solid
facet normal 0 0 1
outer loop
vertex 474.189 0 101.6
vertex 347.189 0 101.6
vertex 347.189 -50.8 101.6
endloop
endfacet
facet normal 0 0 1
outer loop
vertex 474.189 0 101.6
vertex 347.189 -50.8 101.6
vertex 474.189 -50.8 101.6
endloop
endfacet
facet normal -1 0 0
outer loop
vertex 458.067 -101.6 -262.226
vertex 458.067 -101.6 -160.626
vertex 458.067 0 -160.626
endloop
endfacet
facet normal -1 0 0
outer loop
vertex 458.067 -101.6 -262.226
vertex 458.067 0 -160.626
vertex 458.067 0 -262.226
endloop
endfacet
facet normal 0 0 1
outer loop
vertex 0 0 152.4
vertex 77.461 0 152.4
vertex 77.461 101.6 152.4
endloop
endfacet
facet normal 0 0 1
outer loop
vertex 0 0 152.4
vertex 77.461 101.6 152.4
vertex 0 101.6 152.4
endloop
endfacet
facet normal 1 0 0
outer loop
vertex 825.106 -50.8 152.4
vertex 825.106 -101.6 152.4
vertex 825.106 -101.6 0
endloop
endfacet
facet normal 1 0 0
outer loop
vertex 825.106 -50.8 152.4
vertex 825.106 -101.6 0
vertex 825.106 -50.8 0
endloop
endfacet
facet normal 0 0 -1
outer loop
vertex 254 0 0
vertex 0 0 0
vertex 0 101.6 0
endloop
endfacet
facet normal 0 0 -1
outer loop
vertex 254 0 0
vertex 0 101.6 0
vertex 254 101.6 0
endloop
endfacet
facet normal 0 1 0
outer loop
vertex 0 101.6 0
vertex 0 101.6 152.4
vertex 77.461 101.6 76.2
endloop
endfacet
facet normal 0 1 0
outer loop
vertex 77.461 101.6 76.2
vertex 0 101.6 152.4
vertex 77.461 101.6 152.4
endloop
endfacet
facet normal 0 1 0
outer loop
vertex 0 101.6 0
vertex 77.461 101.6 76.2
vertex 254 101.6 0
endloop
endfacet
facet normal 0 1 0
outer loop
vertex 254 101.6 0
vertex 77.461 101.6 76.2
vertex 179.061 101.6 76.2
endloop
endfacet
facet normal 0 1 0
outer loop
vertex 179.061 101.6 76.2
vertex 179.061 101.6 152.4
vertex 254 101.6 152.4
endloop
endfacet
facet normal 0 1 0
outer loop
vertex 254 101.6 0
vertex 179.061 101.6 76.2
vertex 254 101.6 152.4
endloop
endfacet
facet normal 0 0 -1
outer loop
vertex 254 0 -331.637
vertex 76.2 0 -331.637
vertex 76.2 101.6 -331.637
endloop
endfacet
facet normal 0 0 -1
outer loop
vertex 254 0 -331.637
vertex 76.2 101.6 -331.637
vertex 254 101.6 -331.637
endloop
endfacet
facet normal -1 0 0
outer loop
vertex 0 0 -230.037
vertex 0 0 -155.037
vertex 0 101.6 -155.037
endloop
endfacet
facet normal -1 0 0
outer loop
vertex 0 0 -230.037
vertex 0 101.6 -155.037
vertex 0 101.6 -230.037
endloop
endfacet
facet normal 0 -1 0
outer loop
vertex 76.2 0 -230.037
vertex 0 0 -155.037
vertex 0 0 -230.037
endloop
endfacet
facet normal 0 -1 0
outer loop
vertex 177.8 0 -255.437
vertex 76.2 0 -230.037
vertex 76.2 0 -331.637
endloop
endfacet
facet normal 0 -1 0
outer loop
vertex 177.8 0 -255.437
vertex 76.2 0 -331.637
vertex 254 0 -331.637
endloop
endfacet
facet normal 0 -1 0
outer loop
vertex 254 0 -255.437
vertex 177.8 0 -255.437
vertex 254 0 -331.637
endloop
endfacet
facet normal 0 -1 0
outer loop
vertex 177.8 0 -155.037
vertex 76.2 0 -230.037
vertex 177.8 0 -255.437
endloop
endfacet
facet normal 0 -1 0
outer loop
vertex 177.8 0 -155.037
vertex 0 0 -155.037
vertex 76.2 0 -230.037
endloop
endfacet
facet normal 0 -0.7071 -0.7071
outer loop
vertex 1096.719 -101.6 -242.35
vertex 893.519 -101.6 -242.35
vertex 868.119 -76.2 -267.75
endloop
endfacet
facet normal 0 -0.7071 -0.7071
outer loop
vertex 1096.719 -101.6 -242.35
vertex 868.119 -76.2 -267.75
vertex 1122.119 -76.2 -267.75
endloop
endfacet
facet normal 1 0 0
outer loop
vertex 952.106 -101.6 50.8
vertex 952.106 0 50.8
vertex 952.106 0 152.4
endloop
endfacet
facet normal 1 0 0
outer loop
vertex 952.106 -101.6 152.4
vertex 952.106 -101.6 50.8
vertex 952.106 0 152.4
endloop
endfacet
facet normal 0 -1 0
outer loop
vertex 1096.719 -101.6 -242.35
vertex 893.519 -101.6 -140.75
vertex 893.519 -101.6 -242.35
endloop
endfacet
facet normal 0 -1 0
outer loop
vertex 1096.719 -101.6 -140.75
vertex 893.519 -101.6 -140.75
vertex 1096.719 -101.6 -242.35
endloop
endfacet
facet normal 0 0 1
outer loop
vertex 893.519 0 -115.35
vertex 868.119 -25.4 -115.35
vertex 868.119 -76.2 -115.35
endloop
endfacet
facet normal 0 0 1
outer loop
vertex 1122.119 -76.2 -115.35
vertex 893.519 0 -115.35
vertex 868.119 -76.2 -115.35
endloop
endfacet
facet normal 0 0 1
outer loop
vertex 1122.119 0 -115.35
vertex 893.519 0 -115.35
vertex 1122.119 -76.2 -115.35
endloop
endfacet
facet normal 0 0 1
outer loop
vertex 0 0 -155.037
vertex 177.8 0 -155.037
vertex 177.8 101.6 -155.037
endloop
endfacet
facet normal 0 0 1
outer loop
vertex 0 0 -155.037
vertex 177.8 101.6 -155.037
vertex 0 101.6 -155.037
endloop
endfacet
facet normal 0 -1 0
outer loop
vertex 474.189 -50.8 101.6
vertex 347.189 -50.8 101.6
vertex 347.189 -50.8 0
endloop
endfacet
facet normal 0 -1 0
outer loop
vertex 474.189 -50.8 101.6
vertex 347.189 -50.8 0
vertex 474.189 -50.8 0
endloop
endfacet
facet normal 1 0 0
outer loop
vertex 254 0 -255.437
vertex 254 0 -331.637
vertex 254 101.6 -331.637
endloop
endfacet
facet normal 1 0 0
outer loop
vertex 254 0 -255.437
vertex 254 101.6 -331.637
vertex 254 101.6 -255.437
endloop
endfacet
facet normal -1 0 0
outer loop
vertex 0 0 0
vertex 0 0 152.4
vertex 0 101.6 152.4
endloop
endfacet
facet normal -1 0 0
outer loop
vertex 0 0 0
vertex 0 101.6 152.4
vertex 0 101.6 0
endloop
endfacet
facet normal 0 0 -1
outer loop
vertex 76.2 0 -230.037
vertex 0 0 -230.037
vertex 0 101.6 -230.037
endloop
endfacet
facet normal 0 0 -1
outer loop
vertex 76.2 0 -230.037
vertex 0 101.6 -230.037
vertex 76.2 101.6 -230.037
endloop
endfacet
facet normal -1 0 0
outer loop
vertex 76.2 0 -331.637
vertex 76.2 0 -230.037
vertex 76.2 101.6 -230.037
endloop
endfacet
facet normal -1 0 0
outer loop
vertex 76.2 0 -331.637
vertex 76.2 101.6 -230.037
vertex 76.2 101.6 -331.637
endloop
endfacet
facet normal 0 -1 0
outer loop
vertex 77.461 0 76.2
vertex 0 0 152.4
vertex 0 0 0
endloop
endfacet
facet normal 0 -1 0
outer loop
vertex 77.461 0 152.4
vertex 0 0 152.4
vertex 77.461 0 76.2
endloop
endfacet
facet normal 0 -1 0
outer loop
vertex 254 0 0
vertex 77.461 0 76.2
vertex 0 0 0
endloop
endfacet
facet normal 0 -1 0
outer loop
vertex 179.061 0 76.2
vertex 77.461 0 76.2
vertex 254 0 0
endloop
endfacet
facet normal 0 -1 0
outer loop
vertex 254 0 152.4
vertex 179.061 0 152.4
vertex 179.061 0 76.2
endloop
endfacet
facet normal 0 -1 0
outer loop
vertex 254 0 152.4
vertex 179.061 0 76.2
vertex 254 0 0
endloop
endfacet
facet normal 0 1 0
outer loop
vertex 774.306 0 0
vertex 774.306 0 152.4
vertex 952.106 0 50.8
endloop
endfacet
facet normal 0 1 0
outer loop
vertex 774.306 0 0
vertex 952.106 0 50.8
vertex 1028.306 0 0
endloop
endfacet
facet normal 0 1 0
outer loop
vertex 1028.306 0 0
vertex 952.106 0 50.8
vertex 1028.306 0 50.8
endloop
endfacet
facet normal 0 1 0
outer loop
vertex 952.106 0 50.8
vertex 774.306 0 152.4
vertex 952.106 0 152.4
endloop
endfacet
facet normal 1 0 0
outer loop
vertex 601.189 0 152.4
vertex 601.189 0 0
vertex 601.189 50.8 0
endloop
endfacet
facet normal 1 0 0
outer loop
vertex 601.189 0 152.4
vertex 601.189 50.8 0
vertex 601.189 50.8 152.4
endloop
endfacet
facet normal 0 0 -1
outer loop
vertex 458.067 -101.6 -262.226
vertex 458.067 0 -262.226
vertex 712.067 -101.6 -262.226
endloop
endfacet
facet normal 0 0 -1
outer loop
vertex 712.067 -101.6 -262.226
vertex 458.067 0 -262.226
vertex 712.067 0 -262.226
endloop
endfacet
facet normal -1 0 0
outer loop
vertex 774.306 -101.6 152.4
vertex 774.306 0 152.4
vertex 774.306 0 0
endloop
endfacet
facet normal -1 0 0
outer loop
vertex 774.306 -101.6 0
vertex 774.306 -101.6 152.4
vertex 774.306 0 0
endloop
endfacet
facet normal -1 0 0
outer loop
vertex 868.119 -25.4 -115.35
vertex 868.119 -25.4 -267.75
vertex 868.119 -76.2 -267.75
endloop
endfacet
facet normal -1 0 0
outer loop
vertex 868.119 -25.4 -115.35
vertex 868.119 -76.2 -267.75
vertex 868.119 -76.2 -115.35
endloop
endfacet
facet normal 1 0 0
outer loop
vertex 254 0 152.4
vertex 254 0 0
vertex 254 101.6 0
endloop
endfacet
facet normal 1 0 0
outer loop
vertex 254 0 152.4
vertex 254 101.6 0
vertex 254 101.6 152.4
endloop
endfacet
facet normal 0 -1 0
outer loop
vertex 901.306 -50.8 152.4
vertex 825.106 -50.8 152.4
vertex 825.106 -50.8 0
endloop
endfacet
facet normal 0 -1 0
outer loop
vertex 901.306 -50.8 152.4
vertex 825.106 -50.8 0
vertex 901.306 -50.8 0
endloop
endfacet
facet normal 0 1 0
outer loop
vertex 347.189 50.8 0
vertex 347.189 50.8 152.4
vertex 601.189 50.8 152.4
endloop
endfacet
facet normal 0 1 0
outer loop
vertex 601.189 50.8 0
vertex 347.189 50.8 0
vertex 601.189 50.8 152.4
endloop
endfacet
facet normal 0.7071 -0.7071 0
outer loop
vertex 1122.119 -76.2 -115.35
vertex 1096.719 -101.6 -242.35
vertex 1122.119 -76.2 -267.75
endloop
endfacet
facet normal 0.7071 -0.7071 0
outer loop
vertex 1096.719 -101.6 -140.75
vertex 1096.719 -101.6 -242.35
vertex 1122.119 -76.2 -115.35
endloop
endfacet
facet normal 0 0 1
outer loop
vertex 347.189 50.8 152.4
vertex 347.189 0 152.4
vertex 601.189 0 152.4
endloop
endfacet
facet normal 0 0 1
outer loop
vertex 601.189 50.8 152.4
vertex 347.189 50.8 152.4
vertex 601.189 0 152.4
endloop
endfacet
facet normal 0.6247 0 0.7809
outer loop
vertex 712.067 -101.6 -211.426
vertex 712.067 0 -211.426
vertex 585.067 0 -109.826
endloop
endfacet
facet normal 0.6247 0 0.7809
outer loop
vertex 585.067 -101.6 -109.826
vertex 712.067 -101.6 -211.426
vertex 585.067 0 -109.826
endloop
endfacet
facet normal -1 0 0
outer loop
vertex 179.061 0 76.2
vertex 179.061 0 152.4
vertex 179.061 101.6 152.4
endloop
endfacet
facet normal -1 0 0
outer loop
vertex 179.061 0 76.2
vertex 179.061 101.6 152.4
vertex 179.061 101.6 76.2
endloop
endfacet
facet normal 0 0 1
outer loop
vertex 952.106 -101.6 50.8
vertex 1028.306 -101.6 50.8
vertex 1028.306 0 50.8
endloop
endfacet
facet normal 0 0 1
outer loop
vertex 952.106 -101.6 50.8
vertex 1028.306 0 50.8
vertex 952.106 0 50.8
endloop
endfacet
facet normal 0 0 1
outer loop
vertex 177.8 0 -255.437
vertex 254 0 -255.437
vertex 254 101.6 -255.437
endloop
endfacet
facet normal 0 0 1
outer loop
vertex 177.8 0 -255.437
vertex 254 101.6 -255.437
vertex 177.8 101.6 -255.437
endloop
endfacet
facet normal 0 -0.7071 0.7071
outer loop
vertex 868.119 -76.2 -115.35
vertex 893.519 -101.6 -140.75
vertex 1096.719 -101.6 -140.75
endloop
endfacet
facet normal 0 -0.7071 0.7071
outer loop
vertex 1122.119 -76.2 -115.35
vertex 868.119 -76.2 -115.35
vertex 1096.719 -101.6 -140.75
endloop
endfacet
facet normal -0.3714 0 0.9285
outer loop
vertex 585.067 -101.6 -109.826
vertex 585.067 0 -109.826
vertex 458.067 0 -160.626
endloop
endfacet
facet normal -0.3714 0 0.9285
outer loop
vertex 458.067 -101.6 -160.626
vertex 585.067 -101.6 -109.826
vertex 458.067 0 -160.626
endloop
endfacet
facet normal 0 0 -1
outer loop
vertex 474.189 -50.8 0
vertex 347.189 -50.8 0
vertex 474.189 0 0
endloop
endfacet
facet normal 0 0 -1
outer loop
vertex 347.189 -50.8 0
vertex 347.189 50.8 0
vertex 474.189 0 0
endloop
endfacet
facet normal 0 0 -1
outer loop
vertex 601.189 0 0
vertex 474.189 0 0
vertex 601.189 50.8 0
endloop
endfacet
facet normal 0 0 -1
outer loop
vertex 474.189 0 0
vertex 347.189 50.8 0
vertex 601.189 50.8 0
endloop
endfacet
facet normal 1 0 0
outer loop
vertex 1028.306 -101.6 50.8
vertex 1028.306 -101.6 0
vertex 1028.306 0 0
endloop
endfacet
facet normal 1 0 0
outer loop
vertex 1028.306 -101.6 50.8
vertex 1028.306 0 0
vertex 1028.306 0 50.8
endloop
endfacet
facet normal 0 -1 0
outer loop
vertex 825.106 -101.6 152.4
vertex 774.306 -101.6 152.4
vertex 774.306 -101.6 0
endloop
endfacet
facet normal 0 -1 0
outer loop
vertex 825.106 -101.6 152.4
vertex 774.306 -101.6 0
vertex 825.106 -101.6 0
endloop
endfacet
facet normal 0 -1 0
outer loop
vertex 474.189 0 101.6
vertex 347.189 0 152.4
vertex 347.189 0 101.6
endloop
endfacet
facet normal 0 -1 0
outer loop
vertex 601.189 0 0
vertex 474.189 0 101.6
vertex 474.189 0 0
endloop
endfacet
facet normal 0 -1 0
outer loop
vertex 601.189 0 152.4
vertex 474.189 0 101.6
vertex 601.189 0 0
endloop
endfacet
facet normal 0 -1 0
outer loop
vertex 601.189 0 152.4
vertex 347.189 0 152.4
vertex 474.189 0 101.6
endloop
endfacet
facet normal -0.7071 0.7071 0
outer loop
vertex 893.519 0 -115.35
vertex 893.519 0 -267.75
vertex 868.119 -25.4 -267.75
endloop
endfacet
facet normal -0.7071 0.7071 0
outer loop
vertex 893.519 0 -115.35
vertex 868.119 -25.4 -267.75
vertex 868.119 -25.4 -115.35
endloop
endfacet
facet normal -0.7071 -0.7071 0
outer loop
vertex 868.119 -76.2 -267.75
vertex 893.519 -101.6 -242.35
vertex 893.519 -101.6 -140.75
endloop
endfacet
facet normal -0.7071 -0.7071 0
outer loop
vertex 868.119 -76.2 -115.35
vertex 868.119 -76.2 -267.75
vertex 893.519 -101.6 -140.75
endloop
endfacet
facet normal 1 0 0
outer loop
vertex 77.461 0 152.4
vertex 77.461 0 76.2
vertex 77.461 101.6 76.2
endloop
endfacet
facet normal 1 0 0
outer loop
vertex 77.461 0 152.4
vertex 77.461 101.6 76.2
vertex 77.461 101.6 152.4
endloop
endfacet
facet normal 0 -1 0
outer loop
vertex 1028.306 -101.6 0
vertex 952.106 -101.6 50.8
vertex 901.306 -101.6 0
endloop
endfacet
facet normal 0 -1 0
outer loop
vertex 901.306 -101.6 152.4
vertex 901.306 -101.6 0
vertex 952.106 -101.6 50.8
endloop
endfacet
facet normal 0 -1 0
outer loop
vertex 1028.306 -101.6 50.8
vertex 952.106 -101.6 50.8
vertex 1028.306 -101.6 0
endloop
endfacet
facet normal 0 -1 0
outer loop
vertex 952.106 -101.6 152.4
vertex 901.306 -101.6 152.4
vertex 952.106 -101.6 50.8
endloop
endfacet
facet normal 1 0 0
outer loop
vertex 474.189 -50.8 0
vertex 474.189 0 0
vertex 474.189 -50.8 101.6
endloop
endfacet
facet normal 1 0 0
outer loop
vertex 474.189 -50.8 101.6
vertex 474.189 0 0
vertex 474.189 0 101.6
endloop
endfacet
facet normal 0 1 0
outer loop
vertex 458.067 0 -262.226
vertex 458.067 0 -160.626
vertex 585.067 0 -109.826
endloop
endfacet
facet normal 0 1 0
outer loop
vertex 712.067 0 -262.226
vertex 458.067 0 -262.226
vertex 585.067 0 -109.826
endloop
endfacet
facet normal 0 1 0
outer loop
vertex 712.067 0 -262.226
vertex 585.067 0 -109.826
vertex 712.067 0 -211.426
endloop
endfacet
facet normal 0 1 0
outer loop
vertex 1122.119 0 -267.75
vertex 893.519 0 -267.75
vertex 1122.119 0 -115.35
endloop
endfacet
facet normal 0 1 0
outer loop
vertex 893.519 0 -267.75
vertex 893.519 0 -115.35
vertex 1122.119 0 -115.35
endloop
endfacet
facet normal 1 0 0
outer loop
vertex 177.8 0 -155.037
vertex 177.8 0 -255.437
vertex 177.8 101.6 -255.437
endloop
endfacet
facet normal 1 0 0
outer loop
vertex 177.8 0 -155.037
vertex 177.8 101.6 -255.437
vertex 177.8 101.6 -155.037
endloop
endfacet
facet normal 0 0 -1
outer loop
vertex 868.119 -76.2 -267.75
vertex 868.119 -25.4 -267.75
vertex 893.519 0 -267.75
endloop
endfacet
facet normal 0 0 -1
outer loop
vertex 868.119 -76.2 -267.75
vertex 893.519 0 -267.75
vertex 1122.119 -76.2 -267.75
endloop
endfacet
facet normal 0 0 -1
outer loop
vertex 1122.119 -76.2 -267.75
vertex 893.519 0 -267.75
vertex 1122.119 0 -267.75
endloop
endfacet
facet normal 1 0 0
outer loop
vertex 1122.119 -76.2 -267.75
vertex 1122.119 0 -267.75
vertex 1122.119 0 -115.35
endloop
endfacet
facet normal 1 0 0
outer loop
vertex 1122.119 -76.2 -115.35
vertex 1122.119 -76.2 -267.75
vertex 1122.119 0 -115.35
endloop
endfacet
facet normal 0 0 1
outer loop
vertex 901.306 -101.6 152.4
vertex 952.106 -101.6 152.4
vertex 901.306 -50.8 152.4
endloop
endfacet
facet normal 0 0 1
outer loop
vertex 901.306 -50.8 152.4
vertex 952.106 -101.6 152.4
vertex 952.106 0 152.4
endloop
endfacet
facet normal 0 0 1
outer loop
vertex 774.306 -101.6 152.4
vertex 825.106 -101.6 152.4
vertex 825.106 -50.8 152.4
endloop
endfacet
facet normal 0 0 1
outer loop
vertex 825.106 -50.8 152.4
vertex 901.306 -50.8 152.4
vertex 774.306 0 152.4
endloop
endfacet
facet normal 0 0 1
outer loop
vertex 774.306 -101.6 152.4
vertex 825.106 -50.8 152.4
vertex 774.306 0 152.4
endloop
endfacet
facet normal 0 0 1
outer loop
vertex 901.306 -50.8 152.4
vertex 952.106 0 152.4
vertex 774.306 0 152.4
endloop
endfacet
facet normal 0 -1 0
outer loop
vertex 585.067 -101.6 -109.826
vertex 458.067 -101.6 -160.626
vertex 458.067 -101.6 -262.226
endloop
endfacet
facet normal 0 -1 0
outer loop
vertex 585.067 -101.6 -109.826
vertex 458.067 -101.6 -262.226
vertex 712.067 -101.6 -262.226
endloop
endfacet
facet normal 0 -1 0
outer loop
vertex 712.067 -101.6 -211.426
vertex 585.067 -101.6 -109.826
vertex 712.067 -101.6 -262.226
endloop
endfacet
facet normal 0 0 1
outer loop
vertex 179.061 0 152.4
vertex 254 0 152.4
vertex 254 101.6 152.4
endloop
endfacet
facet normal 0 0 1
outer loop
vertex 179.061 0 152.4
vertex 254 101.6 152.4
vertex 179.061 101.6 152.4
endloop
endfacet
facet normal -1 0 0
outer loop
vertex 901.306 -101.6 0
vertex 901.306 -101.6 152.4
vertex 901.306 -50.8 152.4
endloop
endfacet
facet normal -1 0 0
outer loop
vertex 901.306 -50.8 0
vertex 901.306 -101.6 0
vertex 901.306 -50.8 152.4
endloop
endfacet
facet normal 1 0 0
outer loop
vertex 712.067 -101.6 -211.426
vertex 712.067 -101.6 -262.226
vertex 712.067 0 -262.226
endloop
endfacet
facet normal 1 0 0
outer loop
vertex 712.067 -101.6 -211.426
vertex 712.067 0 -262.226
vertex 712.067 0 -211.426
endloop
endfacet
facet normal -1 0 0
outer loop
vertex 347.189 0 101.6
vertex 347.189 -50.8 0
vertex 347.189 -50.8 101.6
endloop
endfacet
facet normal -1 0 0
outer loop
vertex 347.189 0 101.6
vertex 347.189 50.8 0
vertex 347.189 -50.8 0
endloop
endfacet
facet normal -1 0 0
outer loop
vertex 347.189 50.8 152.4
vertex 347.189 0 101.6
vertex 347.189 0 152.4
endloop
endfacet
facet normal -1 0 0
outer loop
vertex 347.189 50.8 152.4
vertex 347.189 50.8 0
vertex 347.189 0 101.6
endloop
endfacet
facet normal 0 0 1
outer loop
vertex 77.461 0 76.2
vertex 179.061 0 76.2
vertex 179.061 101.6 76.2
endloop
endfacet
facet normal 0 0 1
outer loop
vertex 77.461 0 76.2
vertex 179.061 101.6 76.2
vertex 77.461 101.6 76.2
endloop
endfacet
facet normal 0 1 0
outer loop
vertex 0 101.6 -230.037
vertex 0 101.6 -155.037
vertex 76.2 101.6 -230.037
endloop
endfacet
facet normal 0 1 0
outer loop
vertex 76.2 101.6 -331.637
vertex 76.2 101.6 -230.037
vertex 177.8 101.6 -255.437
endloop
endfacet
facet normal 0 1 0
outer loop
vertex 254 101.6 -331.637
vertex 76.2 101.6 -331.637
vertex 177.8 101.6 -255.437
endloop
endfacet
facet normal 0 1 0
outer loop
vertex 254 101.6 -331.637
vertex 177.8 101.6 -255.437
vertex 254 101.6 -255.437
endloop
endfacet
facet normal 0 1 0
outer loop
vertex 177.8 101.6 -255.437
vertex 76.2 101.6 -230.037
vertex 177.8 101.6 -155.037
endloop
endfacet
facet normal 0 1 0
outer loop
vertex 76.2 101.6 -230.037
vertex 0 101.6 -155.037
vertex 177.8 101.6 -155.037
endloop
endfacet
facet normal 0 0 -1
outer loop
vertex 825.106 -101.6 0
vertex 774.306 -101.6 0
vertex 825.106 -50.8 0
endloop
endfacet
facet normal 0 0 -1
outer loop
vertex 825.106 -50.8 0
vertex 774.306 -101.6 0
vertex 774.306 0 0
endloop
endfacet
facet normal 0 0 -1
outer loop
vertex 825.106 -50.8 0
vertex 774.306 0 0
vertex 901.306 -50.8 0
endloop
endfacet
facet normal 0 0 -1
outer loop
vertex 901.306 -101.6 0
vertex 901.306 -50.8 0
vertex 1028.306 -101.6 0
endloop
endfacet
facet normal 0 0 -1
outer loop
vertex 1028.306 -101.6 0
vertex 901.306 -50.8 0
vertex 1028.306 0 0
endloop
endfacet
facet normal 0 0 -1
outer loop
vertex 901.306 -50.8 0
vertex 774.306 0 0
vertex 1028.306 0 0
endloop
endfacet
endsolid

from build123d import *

# Parameters (mm, degrees)
F1_DEPTH  = 101.6
F2_W      = 254
F2_H      = 152.4
F3_DEPTH  = 50.8
F4_W      = 127
F4_H      = 101.6
F5_DEPTH  = 50.8
F7_DEPTH  = 101.6
F8_W      = 76.2
F8_H      = 50.8
F9_DEPTH  = 152.4
F11_DEPTH = 101.6
F13_DEPTH = 101.6
F14_W     = 254
F14_H     = 152.4
F15_DEPTH = 101.6
F16_SIZE  = 25.4


with BuildPart() as f1:
    # F0 (on Front) → F1 (new body)
    with BuildSketch(Plane.XZ):
        Polygon((0, 152.4), (0, 0), (254, 0), (254, 152.4), (179.060987, 152.4), (179.060987, 76.2), (77.460987, 76.2), (77.460987, 152.4), align=None)
    extrude(amount=-F1_DEPTH)


with BuildPart() as f3:
    # F2 (on Front) → F3 (new body)
    with BuildSketch(Plane.XZ):
        with Locations((474.188869, 76.2)):
            Rectangle(F2_W, F2_H)
    extrude(amount=-F3_DEPTH)

    # F4 (on face) → F5 (join)
    with BuildSketch(Plane.XZ):
        with Locations((410.688869, 50.8)):
            Rectangle(F4_W, F4_H)
    extrude(amount=F5_DEPTH)


with BuildPart() as f7:
    # F6 (on Front) → F7 (new body)
    with BuildSketch(Plane.XZ):
        Polygon((774.305682, 152.4), (774.305682, 0), (1028.305682, 0), (1028.305682, 50.8), (952.105682, 50.8), (952.105682, 152.4), align=None)
    extrude(amount=F7_DEPTH)

    # F8 (on face) → F9 (cut)
    with BuildSketch(Plane.XY.offset(152.4)):
        with Locations((863.205682, -76.2)):
            Rectangle(F8_W, F8_H)
    extrude(amount=-F9_DEPTH, mode=Mode.SUBTRACT)


with BuildPart() as f11:
    # F10 (on Front) → F11 (new body)
    with BuildSketch(Plane.XZ):
        Polygon((177.8, -155.036526), (0, -155.036526), (0, -230.036877), (76.2, -230.036877), (76.2, -331.636877), (254, -331.636877), (254, -255.436877), (177.8, -255.436877), align=None)
    extrude(amount=-F11_DEPTH)


with BuildPart() as f13:
    # F12 (on Front) → F13 (new body)
    with BuildSketch(Plane.XZ):
        Polygon((585.066763, -109.82632), (458.066763, -160.62632), (458.066763, -262.22632), (712.066763, -262.22632), (712.066763, -211.42632), align=None)
    extrude(amount=F13_DEPTH)


with BuildPart() as f15:
    # F14 (on Front) → F15 (new body)
    with BuildSketch(Plane.XZ):
        with Locations((995.119065, -191.550298)):
            Rectangle(F14_W, F14_H)
    extrude(amount=F15_DEPTH)

    # F16
    f16_edges = [f15.edges().sort_by_distance(p)[0] for p in [
        (868.119065, 0, -191.550298),
        (995.119065, -101.6, -115.350298),
        (1122.119065, -101.6, -191.550298),
        (995.119065, -101.6, -267.750298),
        (868.119065, -101.6, -191.550298),
    ]]
    chamfer(f16_edges, length=F16_SIZE)


solid = Compound([f1.part, f3.part, f7.part, f11.part, f13.part, f15.part])
